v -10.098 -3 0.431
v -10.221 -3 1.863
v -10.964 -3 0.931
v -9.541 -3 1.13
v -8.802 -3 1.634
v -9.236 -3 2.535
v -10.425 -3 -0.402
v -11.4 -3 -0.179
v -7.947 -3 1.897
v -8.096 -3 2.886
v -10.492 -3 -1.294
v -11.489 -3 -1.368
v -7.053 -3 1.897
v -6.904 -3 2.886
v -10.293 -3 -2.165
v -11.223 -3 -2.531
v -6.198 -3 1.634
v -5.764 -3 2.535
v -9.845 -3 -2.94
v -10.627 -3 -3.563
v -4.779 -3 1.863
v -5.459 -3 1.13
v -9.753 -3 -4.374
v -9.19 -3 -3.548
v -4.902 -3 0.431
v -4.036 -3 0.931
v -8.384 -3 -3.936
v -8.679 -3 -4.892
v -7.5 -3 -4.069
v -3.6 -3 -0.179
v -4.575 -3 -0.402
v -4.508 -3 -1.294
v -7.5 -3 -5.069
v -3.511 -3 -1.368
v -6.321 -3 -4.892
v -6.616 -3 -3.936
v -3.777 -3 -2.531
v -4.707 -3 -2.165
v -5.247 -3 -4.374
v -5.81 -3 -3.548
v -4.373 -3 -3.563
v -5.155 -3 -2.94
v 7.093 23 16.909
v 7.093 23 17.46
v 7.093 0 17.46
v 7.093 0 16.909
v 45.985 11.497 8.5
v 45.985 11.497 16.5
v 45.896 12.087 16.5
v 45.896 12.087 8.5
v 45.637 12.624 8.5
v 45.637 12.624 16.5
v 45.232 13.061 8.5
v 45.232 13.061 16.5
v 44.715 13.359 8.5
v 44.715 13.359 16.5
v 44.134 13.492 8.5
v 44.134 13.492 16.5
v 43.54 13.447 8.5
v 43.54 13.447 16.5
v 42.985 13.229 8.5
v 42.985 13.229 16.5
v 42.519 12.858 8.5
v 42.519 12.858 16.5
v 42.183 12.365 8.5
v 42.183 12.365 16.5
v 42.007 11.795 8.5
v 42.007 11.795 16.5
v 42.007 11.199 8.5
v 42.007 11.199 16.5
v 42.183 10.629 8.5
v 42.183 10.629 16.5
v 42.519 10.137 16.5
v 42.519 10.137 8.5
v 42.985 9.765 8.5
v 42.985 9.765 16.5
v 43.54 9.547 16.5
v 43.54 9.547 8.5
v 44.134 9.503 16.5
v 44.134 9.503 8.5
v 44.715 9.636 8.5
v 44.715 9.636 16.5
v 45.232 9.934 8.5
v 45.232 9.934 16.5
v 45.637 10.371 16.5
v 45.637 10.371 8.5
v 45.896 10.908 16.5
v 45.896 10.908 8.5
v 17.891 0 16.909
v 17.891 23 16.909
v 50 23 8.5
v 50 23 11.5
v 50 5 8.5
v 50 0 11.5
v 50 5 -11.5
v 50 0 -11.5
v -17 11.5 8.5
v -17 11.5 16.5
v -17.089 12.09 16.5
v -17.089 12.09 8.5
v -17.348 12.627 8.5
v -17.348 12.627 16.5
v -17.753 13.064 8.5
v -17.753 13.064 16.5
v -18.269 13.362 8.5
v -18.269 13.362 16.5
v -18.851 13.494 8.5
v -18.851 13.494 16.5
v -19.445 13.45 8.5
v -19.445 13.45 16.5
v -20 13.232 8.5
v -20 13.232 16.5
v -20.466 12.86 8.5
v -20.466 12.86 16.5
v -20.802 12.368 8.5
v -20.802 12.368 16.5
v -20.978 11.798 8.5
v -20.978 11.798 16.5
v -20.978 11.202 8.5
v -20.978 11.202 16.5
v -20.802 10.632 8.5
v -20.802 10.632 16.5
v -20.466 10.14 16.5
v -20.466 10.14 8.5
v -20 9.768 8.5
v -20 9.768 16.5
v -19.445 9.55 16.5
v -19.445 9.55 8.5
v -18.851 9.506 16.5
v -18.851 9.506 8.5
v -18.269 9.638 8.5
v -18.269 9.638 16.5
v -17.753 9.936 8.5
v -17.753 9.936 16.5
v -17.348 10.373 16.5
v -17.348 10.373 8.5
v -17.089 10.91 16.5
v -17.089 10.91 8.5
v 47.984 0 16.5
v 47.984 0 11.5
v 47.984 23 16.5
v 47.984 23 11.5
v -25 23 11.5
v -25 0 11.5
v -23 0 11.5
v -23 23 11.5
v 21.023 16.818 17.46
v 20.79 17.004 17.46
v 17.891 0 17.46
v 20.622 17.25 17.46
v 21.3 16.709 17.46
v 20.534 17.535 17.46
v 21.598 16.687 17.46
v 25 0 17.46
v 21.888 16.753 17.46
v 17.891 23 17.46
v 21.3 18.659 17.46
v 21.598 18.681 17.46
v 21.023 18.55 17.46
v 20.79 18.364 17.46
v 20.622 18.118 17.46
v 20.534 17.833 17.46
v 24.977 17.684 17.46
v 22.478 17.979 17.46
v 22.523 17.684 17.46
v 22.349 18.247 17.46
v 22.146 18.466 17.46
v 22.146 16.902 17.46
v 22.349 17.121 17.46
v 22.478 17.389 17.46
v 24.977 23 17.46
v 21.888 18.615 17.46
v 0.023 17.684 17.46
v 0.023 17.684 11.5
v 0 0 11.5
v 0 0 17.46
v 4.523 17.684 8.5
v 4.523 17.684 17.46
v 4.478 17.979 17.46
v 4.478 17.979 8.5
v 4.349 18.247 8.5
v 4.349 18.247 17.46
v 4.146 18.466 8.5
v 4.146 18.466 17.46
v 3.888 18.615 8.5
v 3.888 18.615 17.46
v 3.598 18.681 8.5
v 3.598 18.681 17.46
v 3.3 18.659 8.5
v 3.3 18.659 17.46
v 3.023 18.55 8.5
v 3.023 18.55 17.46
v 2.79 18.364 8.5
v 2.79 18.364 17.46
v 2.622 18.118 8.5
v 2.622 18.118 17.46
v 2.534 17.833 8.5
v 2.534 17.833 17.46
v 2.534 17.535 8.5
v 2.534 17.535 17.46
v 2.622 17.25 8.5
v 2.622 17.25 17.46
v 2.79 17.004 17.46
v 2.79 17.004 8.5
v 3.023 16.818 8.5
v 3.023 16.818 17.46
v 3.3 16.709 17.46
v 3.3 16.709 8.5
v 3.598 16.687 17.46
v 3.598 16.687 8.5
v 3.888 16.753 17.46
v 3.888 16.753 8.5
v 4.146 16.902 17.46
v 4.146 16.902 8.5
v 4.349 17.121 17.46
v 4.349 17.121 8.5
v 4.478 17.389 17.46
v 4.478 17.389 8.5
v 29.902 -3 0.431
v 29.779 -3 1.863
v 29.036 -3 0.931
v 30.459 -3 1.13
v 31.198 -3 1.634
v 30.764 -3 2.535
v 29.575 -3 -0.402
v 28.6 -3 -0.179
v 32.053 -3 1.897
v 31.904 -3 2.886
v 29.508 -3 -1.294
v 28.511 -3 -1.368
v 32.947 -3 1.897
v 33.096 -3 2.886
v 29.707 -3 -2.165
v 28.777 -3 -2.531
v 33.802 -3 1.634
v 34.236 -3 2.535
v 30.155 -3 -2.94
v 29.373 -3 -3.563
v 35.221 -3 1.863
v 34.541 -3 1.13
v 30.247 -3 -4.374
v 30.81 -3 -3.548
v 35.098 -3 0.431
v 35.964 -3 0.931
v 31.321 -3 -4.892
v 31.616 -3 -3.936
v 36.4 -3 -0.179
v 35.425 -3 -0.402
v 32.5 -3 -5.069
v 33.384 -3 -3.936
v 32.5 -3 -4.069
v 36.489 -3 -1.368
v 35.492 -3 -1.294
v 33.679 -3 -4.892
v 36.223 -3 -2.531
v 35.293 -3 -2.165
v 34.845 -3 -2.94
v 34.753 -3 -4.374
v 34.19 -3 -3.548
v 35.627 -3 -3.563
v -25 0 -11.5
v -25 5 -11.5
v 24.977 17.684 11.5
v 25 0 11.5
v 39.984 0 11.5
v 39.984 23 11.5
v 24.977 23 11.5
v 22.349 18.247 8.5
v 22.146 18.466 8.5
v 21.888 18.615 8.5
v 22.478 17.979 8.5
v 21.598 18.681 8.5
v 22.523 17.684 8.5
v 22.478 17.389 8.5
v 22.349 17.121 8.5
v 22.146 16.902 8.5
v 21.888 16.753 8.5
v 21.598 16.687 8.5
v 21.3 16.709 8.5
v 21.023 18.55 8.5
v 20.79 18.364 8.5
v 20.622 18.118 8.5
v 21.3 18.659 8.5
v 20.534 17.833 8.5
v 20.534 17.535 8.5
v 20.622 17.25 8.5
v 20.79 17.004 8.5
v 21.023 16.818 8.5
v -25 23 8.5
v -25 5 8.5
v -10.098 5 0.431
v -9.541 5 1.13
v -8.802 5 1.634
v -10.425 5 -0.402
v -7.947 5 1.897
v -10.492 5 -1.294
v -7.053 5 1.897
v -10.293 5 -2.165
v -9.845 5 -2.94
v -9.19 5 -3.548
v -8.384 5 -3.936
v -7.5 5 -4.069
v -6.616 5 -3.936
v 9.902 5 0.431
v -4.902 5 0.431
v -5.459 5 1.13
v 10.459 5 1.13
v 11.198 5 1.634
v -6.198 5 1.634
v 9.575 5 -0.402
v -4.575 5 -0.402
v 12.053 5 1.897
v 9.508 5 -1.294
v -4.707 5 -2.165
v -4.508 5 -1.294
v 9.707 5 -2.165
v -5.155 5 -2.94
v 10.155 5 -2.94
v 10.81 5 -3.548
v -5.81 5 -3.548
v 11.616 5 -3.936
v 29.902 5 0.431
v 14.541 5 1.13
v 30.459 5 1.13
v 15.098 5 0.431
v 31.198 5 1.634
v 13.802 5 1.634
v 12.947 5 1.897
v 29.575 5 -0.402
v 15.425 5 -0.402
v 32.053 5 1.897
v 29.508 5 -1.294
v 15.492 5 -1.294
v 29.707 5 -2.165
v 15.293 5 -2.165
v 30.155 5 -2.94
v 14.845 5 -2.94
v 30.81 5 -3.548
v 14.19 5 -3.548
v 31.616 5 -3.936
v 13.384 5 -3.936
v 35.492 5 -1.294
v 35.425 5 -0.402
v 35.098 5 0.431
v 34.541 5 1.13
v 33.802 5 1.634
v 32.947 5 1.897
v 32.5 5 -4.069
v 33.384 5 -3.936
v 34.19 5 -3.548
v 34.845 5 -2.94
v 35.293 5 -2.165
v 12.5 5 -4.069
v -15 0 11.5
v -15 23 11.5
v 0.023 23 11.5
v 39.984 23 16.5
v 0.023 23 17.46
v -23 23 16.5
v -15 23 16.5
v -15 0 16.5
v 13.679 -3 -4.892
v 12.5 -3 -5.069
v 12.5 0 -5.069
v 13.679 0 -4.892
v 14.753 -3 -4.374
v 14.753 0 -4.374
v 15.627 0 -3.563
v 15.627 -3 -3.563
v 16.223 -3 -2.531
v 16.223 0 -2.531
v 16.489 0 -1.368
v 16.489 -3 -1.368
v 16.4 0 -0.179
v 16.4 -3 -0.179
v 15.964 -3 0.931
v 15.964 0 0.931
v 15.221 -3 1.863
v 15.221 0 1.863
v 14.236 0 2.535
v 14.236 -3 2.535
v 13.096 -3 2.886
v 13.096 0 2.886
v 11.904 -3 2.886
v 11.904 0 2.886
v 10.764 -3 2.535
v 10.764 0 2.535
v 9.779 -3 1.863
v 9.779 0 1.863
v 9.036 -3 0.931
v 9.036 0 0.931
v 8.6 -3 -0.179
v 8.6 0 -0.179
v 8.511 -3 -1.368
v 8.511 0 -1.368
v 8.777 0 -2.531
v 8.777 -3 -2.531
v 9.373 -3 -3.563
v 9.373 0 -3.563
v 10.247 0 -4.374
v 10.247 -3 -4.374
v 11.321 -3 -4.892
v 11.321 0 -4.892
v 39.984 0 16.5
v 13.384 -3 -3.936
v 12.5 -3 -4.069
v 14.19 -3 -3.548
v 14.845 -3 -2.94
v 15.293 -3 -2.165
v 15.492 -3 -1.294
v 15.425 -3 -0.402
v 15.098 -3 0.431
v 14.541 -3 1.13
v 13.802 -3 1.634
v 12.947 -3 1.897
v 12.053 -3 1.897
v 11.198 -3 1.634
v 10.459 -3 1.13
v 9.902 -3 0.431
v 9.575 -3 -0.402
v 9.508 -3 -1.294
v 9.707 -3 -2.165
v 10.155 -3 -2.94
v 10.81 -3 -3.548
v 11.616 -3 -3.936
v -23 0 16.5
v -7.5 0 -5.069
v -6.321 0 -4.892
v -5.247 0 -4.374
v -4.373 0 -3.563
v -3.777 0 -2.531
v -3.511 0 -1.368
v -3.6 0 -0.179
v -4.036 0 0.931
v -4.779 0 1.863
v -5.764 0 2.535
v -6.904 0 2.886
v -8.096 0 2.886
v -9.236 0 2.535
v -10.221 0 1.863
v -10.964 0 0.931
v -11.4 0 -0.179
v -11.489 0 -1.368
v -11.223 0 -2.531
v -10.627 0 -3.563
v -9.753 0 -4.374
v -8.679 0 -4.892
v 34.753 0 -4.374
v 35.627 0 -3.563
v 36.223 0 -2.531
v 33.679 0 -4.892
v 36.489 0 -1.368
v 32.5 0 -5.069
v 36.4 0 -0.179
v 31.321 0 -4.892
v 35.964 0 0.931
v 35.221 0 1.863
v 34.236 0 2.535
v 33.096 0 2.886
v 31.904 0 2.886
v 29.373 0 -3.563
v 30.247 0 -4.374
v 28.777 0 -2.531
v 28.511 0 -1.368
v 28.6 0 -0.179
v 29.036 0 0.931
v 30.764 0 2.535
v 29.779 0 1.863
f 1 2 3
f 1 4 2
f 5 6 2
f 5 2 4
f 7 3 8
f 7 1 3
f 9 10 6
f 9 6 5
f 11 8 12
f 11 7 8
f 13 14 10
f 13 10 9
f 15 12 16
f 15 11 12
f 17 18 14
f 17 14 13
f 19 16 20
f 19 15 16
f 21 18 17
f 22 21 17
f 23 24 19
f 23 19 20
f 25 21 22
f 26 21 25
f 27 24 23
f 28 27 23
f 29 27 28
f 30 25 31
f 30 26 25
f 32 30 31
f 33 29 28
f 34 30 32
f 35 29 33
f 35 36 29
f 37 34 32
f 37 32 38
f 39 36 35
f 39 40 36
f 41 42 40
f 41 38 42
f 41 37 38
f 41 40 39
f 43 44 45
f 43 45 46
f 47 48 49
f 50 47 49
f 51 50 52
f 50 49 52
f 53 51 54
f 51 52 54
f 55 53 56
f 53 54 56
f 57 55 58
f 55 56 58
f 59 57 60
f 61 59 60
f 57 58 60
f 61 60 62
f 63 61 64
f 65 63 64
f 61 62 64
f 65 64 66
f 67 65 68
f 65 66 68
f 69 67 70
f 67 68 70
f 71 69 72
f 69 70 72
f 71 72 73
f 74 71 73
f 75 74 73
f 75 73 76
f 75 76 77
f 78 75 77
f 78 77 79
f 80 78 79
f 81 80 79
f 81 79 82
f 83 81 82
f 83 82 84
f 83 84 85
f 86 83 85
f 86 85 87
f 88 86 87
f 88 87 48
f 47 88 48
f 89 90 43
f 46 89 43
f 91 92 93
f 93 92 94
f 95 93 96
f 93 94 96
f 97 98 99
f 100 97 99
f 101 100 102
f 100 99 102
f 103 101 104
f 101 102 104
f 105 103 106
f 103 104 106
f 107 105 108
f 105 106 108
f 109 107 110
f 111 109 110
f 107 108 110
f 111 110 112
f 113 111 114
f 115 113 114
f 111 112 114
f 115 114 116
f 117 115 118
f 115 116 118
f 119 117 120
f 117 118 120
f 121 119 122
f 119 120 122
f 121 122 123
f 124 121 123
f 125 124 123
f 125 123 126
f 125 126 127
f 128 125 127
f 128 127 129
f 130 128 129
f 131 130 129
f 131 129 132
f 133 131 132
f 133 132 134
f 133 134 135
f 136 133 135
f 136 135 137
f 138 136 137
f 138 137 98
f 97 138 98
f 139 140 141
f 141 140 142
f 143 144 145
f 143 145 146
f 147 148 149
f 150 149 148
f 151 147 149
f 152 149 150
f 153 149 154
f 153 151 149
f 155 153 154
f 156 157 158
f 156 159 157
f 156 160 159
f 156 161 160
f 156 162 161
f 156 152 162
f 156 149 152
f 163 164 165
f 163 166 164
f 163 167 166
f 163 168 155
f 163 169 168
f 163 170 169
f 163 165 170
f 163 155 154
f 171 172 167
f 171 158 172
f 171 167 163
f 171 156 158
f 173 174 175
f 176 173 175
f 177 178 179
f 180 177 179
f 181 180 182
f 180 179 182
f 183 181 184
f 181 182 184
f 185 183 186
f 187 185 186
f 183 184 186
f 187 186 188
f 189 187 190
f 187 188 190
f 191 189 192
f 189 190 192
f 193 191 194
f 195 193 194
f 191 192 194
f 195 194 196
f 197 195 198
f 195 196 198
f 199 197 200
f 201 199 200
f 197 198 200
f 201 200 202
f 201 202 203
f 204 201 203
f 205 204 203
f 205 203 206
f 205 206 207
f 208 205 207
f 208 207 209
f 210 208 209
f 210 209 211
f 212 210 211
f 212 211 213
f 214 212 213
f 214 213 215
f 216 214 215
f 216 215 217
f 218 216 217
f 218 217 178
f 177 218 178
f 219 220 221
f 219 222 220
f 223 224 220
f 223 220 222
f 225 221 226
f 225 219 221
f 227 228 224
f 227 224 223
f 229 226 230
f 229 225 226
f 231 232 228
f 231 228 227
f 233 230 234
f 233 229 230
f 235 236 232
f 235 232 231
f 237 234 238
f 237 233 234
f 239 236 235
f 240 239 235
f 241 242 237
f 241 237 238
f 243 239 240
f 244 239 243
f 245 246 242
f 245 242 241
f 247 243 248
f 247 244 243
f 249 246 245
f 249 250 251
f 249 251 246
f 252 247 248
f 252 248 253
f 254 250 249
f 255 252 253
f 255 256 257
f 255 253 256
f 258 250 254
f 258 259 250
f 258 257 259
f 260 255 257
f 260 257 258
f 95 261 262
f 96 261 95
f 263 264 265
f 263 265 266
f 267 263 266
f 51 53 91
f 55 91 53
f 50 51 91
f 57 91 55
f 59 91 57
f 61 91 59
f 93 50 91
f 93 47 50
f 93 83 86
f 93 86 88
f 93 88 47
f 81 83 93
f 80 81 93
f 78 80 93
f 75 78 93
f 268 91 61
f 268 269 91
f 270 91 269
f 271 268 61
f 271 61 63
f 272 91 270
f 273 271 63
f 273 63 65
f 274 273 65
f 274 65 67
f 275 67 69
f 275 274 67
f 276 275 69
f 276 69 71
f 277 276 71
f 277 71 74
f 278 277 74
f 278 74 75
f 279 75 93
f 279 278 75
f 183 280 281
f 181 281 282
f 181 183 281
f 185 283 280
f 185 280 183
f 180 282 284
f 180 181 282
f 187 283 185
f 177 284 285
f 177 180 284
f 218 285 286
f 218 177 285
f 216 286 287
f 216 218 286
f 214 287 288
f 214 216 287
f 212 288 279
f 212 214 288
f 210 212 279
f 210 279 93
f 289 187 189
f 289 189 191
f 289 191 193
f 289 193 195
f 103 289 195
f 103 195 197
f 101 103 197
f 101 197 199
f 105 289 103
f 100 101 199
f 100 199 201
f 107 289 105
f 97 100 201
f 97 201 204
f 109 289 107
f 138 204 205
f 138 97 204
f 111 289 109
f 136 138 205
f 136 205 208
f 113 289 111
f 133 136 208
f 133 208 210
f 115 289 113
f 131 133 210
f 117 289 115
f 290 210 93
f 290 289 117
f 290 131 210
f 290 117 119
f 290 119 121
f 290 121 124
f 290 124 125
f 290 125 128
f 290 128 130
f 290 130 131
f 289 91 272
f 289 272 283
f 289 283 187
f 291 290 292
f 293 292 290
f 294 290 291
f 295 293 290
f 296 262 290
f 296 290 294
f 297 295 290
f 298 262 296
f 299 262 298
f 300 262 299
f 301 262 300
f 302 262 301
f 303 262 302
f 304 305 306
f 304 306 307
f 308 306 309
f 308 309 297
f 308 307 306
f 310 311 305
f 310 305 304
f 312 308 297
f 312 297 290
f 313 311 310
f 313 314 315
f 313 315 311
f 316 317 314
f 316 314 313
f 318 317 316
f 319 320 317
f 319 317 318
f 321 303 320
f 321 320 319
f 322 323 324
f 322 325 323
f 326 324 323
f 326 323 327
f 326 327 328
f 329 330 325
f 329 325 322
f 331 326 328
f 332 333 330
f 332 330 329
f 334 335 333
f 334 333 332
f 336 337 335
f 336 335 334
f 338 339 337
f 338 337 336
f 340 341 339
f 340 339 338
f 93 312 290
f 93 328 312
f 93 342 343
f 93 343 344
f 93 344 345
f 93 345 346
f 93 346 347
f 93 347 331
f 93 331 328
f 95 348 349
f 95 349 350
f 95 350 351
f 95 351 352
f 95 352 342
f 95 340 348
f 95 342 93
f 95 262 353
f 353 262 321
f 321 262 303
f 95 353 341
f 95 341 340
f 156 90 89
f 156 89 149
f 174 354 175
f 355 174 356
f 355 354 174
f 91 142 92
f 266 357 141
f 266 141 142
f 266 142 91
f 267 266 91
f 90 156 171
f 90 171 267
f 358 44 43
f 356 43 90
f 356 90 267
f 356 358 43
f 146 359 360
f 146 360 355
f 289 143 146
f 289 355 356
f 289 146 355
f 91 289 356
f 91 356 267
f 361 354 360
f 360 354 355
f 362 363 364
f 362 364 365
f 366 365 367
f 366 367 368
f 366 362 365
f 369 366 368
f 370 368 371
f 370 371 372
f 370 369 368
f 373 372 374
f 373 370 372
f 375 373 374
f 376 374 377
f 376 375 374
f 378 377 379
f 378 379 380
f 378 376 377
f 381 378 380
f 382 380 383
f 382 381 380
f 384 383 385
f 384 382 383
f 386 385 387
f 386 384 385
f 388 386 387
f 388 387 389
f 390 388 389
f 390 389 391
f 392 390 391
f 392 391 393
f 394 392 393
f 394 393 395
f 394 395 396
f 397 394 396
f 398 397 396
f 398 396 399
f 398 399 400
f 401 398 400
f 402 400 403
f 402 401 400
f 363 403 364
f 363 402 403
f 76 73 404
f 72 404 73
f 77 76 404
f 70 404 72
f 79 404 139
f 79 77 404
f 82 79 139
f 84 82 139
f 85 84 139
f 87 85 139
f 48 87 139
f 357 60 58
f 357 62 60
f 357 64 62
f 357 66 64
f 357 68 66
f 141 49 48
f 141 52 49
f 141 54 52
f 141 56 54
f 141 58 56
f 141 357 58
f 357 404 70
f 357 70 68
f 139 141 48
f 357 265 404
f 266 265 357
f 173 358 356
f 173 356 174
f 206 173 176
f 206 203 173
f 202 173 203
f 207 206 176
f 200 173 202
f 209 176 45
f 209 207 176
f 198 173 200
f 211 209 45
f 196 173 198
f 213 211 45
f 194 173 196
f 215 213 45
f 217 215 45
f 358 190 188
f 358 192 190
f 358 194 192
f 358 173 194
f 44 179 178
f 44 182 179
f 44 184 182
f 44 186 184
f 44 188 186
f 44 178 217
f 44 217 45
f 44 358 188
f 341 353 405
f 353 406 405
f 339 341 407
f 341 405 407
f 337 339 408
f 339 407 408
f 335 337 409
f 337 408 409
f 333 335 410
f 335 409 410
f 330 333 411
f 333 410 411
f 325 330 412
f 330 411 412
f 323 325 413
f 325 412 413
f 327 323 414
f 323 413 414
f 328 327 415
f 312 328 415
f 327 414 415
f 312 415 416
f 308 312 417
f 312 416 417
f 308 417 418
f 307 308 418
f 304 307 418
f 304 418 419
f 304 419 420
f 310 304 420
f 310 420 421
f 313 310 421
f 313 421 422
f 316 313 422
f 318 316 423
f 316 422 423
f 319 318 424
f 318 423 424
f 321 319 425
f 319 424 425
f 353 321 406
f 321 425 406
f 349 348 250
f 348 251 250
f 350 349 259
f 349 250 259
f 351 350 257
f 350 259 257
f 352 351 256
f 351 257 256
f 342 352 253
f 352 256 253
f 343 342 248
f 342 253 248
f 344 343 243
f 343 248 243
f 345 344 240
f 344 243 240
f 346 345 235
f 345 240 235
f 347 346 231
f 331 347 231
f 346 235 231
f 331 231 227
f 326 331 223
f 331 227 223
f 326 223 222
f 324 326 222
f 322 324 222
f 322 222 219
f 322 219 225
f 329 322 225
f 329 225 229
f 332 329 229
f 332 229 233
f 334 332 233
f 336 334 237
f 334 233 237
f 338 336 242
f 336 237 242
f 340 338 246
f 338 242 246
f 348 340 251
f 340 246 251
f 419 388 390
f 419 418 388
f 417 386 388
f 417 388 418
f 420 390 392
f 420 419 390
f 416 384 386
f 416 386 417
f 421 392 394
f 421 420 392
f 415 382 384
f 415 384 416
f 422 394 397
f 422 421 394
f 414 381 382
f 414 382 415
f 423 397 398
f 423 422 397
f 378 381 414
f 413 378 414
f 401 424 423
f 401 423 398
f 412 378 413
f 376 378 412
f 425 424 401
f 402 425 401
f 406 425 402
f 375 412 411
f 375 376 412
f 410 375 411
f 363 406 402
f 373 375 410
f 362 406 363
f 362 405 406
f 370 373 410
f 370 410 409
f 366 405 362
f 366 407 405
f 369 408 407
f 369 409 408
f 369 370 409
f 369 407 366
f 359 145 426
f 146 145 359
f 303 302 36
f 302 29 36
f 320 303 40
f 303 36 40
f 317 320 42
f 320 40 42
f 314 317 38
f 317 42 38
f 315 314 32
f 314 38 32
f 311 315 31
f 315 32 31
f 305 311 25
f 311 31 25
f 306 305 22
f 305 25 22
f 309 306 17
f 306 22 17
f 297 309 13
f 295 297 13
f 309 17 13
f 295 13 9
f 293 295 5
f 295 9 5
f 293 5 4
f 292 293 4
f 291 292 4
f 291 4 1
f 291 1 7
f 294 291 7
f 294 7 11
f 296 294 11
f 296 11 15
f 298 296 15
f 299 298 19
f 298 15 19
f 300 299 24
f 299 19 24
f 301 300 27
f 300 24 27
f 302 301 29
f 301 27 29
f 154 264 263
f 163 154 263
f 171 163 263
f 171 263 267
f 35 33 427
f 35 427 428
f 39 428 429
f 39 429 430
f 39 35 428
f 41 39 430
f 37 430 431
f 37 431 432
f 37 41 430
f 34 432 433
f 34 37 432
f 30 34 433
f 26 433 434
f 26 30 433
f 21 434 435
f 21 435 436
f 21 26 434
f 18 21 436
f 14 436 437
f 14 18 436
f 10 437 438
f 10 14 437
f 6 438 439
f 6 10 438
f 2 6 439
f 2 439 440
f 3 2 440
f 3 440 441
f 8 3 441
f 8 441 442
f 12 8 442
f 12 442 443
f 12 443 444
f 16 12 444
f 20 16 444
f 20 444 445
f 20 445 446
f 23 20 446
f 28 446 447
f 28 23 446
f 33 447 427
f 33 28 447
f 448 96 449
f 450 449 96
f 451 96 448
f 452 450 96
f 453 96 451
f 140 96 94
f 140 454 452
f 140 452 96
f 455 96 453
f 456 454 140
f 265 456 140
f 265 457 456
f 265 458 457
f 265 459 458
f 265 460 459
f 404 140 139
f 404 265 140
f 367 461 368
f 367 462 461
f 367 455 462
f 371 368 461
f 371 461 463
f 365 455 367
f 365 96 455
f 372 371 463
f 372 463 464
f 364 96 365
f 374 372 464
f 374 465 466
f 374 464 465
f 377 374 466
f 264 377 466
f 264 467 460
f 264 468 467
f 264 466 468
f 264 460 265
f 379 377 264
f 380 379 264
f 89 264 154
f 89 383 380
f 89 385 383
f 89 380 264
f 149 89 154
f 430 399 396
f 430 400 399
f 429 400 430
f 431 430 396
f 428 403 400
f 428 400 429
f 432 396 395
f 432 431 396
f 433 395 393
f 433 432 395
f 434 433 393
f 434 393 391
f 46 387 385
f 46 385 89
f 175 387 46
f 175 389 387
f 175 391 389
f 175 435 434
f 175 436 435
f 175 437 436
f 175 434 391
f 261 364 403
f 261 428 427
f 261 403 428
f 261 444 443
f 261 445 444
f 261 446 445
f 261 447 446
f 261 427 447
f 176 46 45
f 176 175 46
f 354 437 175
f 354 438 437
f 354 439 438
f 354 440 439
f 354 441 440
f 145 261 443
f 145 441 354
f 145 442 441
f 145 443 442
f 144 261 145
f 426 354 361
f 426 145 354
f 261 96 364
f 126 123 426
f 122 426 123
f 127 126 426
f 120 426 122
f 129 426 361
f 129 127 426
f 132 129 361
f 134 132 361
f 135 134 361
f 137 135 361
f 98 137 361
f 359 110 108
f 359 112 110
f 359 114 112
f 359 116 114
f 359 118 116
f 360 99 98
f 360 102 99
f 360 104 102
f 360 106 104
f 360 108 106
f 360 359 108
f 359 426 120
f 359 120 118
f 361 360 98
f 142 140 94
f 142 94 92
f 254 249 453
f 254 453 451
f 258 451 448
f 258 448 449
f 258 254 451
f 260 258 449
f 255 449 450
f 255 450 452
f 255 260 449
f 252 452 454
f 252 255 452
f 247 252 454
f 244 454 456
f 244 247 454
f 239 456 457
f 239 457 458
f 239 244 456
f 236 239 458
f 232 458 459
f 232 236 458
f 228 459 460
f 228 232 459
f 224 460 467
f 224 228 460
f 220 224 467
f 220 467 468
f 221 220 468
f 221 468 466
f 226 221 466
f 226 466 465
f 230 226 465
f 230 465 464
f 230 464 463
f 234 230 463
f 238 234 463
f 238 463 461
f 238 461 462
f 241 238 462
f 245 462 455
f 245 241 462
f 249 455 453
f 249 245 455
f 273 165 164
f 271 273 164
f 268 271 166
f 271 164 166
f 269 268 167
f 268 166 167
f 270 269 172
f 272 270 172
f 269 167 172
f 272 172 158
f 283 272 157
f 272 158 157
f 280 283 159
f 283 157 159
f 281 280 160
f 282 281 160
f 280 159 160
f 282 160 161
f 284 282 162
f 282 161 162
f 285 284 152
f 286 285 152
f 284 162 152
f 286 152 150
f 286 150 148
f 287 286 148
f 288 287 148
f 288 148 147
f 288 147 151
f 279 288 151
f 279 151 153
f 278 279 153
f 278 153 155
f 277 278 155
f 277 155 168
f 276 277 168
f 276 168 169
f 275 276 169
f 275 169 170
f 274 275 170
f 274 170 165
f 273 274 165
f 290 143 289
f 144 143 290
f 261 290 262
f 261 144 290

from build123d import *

# Parameters (mm, degrees)
SKETCH1_W            = 50
SKETCH1_H            = 23
BOSS_EXTRUDE12_DEPTH = 3
SKETCH17_W           = 50
SKETCH17_H           = 3
BOSS_EXTRUDE13_DEPTH = 20
BOSS_EXTRUDE15_DEPTH = 25
SKETCH19_R           = 3
CUT_EXTRUDE1_DEPTH   = 10
BOSS_EXTRUDE17_DEPTH = 5.96
CUT_EXTRUDE2_DEPTH   = 58.739515066
SKETCH23_R           = 1
CUT_EXTRUDE3_DEPTH   = 63.190687406
SKETCH24_W           = 8
SKETCH24_H           = 23
BOSS_EXTRUDE20_DEPTH = 5
BOSS_EXTRUDE22_START = 3
SKETCH20_R           = 4
SKETCH20_R_2         = 3
BOSS_EXTRUDE22_DEPTH = 3
SKETCH25_R           = 2
CUT_EXTRUDE4_DEPTH   = 62.749493925
SKETCH26_W           = 75
SKETCH26_H           = 20
BOSS_EXTRUDE23_DEPTH = 2
SKETCH27_R           = 3
CUT_EXTRUDE5_DEPTH   = 57.611408744


with BuildPart() as part:
    # Sketch1 → Boss-Extrude12 (new body)
    with BuildSketch(Plane(origin=(0, 0, 0), x_dir=(1, 0, 0), z_dir=(0, 1, 0))):
        Rectangle(SKETCH1_W, SKETCH1_H)
    extrude(amount=BOSS_EXTRUDE12_DEPTH)

    # Sketch17 → Boss-Extrude13 (add)
    with BuildSketch(Plane(origin=(0, 3, 0), x_dir=(1, 0, 0), z_dir=(0, 1, 0))):
        with Locations((0, -10)):
            Rectangle(SKETCH17_W, SKETCH17_H)
    extrude(amount=BOSS_EXTRUDE13_DEPTH)

    # Sketch18 → Boss-Extrude15 (add)
    with BuildSketch(Plane(origin=(25, 0, 0), x_dir=(0, 0, -1), z_dir=(1, 0, 0))):
        Polygon((-11.5, 23), (-8.5, 23), (-8.5, 3), (11.5, 3), (11.5, 0), (-11.5, 0), align=None)
    extrude(amount=BOSS_EXTRUDE15_DEPTH)

    # Sketch19 → Cut-Extrude1 (cut)
    with BuildSketch(Plane.XZ):
        with Locations(Location((-7.5, -1.069311776, 0), (0, 0, 270))):
            Circle(SKETCH19_R)
        with Locations(Location((12.5, -1.069311776, 0), (0, 0, 270))):
            Circle(SKETCH19_R)
        with Locations(Location((32.5, -1.069311776, 0), (0, 0, 270))):
            Circle(SKETCH19_R)
    extrude(amount=-CUT_EXTRUDE1_DEPTH, mode=Mode.SUBTRACT)

    # Sketch21 → Boss-Extrude17 (add)
    with BuildSketch(Plane.XY.offset(11.5)):
        Polygon((0.022791851, 17.683942334), (0, 0), (25, 0), (24.977208149, 17.683942334), (24.977208149, 23), (0.022791851, 23), align=None)
    extrude(amount=BOSS_EXTRUDE17_DEPTH)

    # Sketch22 → Cut-Extrude2 (cut, through all)
    with BuildSketch(Plane(origin=(0, 23, 0), x_dir=(1, 0, 0), z_dir=(0, 1, 0))):
        Polygon((15.892859801, -16.90901318), (17.890847614, -16.90901318), (17.890847614, -17.46), (7.092859801, -17.46), (7.092859801, -16.90901318), (9.092859801, -16.90901318), align=None)
    extrude(amount=-CUT_EXTRUDE2_DEPTH, mode=Mode.SUBTRACT)

    # Sketch23 → Cut-Extrude3 (cut, through all)
    with BuildSketch(Plane.XY.offset(17.46)):
        with Locations((3.522791851, 17.683942334)):
            Circle(SKETCH23_R)
        with Locations((21.522791851, 17.683942334)):
            Circle(SKETCH23_R)
    extrude(amount=-CUT_EXTRUDE3_DEPTH, mode=Mode.SUBTRACT)

    # Sketch24 → Boss-Extrude20 (add)
    with BuildSketch(Plane.XY.offset(11.5)):
        with Locations((-19, 11.5)):
            Rectangle(SKETCH24_W, SKETCH24_H)
        with Locations((43.983707415, 11.5)):
            Rectangle(SKETCH24_W, SKETCH24_H)
    extrude(amount=BOSS_EXTRUDE20_DEPTH)

    # Sketch20 → Boss-Extrude22 (add)
    # profile 1 of 3: a face of its own
    with BuildSketch(Plane.XZ.offset(BOSS_EXTRUDE22_START)):
        with Locations(Location((-7.5, -1.069311776, 0), (0, 0, 270))):
            Circle(SKETCH20_R)
        with Locations(Location((-7.5, -1.069311776, 0), (0, 0, 270))):
            Circle(SKETCH20_R_2, mode=Mode.SUBTRACT)
    # profile 2 of 3: a face of its own
    with BuildSketch(Plane.XZ.offset(BOSS_EXTRUDE22_START)):
        with Locations(Location((12.5, -1.069311776, 0), (0, 0, 270))):
            Circle(SKETCH20_R)
        with Locations(Location((12.5, -1.069311776, 0), (0, 0, 270))):
            Circle(SKETCH20_R_2, mode=Mode.SUBTRACT)
    # profile 3 of 3: a face of its own
    with BuildSketch(Plane.XZ.offset(BOSS_EXTRUDE22_START)):
        with Locations(Location((32.5, -1.069311776, 0), (0, 0, 270))):
            Circle(SKETCH20_R)
        with Locations(Location((32.5, -1.069311776, 0), (0, 0, 270))):
            Circle(SKETCH20_R_2, mode=Mode.SUBTRACT)
    extrude(amount=-BOSS_EXTRUDE22_DEPTH)

    # Sketch25 → Cut-Extrude4 (cut, through all)
    with BuildSketch(Plane.XY.offset(16.5)):
        with Locations((43.984708093, 11.497259352)):
            Circle(SKETCH25_R)
        with Locations((-19, 11.5)):
            Circle(SKETCH25_R)
    extrude(amount=-CUT_EXTRUDE4_DEPTH, mode=Mode.SUBTRACT)

    # Sketch26 → Boss-Extrude23 (add)
    with BuildSketch(Plane(origin=(0, 3, 0), x_dir=(1, 0, 0), z_dir=(0, 1, 0))):
        with Locations((12.5, 1.5)):
            Rectangle(SKETCH26_W, SKETCH26_H)
    extrude(amount=BOSS_EXTRUDE23_DEPTH)

    # Sketch27 → Cut-Extrude5 (cut, through all)
    with BuildSketch(Plane.XZ.offset(-3)):
        with Locations(Location((-7.5, -1.069311776, 0), (0, 0, 270))):
            Circle(SKETCH27_R)
        with Locations(Location((12.5, -1.069311776, 0), (0, 0, 270))):
            Circle(SKETCH27_R)
        with Locations(Location((32.5, -1.069311776, 0), (0, 0, 270))):
            Circle(SKETCH27_R)
    extrude(amount=-CUT_EXTRUDE5_DEPTH, mode=Mode.SUBTRACT)


solid = part.part
